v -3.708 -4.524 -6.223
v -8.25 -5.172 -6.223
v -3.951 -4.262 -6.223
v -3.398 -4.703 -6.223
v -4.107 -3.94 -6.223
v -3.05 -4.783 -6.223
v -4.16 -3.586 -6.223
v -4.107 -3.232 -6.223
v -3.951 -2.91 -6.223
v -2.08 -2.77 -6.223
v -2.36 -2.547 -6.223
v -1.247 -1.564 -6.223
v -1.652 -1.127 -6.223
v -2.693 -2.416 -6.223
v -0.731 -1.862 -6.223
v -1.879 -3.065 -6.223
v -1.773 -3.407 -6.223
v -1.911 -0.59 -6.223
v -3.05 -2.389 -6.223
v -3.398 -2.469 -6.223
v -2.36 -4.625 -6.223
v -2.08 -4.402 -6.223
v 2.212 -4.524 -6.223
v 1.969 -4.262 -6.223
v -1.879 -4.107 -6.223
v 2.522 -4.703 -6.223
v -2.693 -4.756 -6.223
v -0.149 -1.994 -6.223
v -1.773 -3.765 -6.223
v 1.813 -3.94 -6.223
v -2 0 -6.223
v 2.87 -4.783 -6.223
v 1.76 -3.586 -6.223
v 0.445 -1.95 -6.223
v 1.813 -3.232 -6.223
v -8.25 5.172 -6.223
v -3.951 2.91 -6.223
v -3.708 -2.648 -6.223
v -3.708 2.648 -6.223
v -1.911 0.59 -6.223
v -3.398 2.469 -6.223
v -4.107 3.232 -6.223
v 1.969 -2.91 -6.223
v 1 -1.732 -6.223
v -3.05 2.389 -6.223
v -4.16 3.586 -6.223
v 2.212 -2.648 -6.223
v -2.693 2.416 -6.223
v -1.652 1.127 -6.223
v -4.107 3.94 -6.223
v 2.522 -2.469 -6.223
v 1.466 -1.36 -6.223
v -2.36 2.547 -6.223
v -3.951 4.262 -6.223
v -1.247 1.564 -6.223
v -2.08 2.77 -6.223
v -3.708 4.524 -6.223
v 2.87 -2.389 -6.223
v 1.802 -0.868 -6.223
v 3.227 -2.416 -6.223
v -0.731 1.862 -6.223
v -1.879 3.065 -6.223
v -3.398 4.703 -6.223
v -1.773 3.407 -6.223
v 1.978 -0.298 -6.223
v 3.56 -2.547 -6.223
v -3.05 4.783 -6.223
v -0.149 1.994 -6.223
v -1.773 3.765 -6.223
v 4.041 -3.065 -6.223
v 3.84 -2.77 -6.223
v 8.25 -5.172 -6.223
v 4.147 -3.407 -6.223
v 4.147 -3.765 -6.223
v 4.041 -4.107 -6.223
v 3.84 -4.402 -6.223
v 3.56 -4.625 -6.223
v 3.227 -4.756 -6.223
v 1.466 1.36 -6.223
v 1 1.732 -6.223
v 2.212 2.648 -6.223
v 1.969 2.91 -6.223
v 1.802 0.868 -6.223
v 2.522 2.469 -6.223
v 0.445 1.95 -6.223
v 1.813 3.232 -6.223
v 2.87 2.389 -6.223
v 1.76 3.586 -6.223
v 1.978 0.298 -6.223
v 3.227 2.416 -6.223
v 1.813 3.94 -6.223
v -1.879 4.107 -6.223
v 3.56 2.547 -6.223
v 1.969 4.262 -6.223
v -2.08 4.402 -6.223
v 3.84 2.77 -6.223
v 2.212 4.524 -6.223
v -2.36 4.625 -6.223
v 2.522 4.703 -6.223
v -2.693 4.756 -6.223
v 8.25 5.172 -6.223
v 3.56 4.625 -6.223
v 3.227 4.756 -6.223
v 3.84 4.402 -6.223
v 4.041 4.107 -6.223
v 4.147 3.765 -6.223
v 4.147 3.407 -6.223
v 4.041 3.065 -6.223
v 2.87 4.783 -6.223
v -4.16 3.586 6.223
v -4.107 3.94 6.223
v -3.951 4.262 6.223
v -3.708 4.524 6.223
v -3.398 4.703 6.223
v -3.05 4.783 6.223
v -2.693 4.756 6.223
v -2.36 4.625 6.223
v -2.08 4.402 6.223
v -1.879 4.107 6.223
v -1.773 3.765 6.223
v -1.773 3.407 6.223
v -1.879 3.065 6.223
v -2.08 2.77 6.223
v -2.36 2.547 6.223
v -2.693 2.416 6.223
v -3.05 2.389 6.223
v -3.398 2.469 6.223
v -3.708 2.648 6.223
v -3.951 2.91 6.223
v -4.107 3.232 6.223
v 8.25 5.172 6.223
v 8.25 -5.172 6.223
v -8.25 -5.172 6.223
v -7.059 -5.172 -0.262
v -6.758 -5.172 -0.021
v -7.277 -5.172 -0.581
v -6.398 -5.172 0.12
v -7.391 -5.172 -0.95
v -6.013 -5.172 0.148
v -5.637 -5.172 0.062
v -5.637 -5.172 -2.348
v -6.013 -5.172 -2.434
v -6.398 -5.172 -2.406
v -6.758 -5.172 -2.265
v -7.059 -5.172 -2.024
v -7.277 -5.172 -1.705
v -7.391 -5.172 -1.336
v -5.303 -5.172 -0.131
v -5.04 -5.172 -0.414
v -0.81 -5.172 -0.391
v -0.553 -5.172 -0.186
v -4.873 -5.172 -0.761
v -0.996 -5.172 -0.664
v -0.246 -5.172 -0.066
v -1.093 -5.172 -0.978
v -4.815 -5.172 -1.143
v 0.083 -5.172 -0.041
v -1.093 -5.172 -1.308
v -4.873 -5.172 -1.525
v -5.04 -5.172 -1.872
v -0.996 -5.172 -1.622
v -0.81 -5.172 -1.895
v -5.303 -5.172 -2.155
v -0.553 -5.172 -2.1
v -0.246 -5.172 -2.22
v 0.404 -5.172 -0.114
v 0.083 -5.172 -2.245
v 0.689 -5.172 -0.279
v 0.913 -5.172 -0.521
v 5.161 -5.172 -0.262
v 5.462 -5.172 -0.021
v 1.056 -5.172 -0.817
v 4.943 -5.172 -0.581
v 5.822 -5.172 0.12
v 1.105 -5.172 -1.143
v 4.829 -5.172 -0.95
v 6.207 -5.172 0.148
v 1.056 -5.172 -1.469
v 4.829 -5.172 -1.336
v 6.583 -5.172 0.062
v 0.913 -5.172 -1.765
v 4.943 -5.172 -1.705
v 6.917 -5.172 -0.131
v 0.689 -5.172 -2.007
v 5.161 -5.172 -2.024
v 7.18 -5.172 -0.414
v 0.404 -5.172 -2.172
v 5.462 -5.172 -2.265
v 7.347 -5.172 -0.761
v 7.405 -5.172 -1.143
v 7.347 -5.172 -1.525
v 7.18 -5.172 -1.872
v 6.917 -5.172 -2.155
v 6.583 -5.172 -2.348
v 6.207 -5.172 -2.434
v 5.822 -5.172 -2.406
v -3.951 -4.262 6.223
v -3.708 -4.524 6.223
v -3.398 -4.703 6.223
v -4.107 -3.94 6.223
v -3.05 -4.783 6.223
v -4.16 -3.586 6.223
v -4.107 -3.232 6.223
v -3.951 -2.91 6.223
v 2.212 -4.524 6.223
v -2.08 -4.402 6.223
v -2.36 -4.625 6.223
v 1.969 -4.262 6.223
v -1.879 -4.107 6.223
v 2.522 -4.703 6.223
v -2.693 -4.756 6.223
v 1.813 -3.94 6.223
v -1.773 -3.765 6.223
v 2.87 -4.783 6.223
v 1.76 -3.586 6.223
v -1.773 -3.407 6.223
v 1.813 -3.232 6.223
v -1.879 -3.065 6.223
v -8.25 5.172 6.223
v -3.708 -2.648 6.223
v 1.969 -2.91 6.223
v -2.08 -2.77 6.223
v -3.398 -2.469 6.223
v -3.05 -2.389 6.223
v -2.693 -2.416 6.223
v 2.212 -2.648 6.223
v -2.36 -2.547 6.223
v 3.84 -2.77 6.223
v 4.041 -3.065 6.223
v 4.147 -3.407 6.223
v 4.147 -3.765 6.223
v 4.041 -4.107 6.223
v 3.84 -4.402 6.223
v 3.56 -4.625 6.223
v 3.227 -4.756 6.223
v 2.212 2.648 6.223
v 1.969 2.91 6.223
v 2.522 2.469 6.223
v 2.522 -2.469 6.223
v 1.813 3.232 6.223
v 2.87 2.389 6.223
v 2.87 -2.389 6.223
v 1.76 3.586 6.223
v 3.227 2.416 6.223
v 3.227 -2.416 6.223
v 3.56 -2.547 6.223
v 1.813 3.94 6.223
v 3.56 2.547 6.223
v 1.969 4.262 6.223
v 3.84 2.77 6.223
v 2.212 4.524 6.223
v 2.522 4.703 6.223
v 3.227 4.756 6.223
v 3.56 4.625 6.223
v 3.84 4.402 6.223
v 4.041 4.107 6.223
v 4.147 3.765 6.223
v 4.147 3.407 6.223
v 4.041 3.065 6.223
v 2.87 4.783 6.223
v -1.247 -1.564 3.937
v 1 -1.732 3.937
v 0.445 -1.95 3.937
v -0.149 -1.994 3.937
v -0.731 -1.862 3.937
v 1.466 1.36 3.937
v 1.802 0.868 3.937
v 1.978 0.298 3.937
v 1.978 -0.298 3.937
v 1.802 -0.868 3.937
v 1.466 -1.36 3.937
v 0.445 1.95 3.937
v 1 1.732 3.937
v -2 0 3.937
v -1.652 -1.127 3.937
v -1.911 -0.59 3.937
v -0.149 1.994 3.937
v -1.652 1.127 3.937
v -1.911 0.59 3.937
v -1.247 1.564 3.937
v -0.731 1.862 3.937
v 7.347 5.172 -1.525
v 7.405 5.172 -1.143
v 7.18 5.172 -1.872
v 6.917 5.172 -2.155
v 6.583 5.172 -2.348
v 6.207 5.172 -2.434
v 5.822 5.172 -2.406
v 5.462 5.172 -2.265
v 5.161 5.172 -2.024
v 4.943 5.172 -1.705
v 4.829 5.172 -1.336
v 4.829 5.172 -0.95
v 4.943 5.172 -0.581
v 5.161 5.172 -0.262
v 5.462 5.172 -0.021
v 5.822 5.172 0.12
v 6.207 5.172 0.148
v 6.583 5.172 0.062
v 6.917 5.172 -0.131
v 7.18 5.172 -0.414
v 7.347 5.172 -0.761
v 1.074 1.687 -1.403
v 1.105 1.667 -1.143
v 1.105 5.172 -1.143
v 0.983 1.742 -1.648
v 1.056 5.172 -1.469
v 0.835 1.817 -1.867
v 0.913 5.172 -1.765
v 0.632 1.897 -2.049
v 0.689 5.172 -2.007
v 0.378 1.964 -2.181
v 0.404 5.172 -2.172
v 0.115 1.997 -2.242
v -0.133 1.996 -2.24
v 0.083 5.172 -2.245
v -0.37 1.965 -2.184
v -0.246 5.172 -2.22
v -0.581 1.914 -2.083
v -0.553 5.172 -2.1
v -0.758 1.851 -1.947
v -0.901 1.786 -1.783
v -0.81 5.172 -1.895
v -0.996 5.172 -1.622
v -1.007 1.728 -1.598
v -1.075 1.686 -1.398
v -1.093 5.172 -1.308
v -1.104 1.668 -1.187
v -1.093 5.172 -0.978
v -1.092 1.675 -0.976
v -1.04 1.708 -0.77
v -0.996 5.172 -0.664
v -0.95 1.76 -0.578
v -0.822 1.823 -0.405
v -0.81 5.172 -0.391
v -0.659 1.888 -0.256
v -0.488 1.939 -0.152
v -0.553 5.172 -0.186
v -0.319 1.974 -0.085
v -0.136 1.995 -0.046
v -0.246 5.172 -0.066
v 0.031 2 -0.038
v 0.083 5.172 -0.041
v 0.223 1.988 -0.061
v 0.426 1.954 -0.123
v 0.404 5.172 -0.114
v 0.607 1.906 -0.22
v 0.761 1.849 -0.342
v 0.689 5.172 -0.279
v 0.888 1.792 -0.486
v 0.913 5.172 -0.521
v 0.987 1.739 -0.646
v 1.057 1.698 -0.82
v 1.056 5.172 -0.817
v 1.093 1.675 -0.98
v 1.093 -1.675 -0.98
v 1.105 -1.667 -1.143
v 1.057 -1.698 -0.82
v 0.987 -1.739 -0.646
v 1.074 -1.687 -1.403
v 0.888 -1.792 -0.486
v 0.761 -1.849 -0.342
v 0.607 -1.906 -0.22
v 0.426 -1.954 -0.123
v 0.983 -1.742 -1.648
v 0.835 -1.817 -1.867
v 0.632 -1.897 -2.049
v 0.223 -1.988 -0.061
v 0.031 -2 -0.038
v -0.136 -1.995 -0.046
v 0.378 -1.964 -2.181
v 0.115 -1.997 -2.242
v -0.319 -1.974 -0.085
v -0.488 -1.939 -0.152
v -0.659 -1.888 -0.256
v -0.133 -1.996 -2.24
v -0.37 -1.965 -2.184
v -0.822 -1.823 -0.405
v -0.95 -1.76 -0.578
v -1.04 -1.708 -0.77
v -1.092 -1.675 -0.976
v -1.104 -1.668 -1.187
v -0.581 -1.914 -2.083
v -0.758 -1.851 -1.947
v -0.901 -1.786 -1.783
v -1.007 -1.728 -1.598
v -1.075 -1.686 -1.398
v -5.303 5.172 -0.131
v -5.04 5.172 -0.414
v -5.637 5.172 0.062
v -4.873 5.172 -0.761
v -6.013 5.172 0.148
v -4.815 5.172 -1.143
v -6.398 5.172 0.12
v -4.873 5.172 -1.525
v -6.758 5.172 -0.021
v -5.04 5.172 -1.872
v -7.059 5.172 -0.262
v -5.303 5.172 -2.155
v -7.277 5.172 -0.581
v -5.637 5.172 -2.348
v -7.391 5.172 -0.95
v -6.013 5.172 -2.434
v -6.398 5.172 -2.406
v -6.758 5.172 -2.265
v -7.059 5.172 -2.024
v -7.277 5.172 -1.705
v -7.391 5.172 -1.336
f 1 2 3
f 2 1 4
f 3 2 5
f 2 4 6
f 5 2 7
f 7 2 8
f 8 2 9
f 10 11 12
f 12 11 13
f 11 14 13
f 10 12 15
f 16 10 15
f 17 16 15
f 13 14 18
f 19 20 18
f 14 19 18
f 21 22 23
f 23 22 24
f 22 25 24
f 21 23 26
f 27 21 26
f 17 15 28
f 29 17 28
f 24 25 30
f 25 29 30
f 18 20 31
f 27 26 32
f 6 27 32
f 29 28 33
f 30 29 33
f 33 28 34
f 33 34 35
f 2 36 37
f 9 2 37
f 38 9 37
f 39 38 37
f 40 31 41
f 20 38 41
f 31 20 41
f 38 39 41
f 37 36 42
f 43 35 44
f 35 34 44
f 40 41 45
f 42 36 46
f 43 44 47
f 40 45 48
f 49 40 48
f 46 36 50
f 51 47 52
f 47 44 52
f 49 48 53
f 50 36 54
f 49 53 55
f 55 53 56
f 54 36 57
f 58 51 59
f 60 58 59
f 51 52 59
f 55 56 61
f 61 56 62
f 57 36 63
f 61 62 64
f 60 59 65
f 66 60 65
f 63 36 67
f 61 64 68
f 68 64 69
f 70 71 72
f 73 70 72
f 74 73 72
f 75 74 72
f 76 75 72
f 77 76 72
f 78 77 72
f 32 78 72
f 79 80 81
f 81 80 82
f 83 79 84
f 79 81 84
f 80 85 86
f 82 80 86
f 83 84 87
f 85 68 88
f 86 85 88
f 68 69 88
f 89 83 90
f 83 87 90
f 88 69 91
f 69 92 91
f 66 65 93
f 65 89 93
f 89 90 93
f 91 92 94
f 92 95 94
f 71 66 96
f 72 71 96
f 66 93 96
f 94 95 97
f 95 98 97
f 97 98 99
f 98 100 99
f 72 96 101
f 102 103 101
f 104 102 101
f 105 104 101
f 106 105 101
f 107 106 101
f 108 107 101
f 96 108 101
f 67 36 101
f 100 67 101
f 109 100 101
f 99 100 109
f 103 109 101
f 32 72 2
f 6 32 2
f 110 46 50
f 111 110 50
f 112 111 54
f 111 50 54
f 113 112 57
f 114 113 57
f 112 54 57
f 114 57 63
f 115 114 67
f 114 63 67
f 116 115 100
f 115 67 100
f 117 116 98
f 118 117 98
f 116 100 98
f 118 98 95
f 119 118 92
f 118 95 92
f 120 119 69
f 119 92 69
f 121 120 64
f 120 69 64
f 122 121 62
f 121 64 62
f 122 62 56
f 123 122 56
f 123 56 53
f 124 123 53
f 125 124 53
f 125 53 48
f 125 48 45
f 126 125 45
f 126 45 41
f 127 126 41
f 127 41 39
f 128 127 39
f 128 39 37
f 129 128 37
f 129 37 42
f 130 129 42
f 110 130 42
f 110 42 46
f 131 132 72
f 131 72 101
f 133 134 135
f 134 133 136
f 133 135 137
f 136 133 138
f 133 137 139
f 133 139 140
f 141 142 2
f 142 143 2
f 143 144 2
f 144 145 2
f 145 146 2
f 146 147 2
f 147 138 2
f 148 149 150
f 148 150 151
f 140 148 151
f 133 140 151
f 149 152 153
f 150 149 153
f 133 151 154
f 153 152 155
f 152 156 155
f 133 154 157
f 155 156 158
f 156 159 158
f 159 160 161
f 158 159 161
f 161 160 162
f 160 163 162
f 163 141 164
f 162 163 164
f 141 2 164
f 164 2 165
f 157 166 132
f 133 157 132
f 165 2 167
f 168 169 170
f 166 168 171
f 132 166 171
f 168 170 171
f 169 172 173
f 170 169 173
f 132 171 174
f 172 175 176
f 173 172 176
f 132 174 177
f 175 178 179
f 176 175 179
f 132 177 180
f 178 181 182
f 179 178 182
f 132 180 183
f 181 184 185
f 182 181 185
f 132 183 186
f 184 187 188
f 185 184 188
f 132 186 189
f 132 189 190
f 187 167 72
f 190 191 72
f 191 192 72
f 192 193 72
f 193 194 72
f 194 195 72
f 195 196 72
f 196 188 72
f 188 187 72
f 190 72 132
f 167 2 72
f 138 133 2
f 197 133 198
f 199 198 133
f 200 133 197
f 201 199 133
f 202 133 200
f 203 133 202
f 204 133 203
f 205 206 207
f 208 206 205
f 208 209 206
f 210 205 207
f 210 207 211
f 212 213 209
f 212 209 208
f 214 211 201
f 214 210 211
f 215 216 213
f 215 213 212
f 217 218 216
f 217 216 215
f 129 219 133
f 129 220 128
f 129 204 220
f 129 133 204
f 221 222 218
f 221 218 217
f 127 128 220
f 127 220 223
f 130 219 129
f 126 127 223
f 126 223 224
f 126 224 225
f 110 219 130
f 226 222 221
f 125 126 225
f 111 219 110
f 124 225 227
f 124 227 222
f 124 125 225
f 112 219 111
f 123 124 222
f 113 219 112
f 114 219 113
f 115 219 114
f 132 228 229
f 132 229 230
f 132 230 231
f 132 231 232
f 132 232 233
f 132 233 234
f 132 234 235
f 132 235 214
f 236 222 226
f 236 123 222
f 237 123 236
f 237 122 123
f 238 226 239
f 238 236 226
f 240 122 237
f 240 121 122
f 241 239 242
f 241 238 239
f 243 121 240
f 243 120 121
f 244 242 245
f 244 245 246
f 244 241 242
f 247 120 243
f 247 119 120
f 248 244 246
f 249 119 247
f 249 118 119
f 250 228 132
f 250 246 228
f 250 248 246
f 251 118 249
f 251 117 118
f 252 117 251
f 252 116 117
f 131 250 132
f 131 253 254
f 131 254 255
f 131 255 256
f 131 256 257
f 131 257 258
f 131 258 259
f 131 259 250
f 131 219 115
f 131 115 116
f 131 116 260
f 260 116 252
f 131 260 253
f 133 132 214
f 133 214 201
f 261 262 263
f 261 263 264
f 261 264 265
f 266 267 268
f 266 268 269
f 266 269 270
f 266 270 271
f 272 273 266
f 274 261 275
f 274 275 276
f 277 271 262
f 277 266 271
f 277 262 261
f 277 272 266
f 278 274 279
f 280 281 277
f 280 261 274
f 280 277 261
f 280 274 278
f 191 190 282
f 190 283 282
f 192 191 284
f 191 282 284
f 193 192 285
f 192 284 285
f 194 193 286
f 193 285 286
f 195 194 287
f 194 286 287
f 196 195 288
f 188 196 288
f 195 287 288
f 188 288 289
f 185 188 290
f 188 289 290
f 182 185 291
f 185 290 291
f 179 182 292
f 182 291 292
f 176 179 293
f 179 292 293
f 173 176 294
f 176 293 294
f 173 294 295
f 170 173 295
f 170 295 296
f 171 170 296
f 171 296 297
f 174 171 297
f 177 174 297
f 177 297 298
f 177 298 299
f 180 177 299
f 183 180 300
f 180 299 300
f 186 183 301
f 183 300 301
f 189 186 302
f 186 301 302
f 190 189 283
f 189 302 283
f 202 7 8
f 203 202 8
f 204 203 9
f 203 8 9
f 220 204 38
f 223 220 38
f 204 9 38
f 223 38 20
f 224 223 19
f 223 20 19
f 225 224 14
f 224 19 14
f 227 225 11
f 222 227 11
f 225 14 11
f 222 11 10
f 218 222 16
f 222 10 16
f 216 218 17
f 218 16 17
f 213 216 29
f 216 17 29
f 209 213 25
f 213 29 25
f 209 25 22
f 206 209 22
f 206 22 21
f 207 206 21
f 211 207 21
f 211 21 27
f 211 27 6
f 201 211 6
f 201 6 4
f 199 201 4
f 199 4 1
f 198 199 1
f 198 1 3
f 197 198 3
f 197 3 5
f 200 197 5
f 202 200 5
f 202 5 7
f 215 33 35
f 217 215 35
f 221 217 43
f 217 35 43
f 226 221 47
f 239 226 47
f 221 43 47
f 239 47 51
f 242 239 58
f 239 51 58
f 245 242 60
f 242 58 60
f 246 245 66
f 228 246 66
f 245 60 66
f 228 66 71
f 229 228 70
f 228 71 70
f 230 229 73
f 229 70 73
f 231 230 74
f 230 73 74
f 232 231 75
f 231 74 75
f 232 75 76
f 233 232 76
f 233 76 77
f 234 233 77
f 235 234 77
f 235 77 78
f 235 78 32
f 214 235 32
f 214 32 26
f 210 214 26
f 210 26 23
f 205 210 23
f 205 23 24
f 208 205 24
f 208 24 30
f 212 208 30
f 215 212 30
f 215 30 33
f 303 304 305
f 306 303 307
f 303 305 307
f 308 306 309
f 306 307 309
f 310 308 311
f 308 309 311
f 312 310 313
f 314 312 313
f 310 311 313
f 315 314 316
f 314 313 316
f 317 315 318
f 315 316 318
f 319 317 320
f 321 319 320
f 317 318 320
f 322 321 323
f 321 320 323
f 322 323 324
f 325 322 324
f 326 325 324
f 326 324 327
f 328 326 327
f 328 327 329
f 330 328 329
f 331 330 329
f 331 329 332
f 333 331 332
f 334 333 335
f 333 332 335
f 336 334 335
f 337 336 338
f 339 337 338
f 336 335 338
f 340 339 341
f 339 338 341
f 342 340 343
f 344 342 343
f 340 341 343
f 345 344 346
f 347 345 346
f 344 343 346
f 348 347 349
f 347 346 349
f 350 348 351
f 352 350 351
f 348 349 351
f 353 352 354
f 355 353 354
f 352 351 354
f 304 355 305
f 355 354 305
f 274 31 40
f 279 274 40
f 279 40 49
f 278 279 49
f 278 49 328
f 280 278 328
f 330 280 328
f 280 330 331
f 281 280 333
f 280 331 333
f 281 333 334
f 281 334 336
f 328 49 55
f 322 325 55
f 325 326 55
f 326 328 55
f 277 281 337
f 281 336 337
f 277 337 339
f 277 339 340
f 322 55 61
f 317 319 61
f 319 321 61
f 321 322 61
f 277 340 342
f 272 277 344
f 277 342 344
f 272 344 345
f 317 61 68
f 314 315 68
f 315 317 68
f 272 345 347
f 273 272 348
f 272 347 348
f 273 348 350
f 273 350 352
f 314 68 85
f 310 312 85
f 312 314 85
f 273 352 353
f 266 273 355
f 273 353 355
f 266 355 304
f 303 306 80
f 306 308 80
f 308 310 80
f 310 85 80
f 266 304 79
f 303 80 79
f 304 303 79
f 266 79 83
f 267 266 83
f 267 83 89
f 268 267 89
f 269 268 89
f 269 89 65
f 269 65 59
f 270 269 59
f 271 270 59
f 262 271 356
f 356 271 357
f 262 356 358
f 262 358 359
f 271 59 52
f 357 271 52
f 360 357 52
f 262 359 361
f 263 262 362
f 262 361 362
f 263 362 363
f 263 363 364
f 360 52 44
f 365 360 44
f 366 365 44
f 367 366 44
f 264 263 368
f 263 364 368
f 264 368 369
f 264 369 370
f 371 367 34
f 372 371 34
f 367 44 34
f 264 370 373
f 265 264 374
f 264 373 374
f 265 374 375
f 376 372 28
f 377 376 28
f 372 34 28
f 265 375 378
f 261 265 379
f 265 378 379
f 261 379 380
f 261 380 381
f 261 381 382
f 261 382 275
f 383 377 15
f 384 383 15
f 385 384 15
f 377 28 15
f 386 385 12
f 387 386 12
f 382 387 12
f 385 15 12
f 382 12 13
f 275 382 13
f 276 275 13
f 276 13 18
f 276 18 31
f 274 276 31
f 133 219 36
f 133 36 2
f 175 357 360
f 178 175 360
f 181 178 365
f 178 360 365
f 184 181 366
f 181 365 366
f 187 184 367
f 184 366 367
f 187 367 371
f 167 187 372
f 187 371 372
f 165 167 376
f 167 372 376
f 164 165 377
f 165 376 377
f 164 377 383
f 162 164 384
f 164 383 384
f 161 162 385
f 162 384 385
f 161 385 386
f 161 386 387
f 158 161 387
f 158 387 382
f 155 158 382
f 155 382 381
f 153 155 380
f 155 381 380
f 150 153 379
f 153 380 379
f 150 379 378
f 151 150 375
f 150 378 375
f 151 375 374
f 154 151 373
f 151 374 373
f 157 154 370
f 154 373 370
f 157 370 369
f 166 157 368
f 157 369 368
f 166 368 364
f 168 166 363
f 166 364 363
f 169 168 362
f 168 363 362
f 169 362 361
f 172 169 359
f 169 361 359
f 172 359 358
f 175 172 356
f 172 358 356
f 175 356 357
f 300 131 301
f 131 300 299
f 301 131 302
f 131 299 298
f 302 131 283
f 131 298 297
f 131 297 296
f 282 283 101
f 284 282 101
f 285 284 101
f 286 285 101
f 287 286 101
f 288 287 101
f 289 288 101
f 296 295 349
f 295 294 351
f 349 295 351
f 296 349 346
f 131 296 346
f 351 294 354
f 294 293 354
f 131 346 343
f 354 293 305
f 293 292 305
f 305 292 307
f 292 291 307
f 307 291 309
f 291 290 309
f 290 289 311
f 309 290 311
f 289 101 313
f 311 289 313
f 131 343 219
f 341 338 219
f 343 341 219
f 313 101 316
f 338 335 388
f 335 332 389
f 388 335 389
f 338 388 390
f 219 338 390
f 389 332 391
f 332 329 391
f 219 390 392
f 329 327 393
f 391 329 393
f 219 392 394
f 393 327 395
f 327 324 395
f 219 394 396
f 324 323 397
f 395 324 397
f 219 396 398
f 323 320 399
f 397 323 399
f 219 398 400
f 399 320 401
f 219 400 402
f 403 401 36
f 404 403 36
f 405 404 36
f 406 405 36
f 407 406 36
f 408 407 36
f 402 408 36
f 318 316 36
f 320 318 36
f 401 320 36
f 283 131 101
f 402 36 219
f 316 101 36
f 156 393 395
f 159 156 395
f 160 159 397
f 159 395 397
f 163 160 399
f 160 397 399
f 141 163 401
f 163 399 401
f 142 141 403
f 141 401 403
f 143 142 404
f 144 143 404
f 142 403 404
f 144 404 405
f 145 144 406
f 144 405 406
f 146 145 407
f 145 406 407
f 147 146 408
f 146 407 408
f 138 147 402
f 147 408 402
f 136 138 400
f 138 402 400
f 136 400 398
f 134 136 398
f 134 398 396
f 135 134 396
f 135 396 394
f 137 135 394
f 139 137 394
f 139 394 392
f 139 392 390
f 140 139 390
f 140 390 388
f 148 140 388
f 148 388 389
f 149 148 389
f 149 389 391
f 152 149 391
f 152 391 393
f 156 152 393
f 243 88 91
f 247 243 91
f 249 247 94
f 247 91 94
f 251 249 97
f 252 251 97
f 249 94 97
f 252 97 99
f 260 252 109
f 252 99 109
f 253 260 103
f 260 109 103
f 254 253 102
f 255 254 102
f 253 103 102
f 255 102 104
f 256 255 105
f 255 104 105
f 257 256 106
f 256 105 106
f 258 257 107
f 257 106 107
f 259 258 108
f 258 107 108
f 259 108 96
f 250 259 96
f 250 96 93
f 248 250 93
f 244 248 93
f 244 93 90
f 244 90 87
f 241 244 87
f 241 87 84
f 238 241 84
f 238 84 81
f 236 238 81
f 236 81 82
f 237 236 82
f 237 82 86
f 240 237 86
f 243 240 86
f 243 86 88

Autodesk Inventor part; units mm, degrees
ref_plane "YZ Plane" through (0, 0, 0) normal (1, 0, 0) x (0, 1, 0)
ref_plane "XZ Plane" through (0, 0, 0) normal (0, 1, 0) x (-1, 0, 0)
ref_plane "XY Plane" through (0, 0, 0) normal (0, 0, 1) x (1, 0, 0)
sketch "Sketch1" plane through (0, 0, 0) normal (0, 0, 1) x (1, 0, 0)
  line L0 (8.25, 5.172) -> (-8.25, 5.172)
  line L1 (-8.25, 5.172) -> (-8.25, -5.172)
  line L2 (-8.25, -5.172) -> (8.25, -5.172)
  line L3 (8.25, -5.172) -> (8.25, 5.172)
  point P0 (0, 0)
  dimension "d19" = 10.344
  dimension "d36" = 16.5
  dimension "d37" = 5.172
extrude "Box" add sketch "Sketch1" along normal mid plane 12.446
sketch "Sketch3" plane through (0, 0, -6.223) normal (0, 0, -1) x (-1, 0, 0)
  line L0 (-5.08, 0) -> (5.08, 0) construction
  line L1 (-4.75, 0) -> (4.75, 0) construction
  circle A0 centre (0, 0) radius 2
  dimension "d35" = 4
extrude "Slot" cut sketch "Sketch3" against normal blind 10.16
sketch "Sketch4" plane through (0, 0, -6.223) normal (0, 0, -1) x (-1, 0, 0)
  circle A0 centre (-2.96, 3.586) radius 1.2
  line L0 (8.25, 5.172) -> (-8.25, 5.172) projected
  circle A1 centre (0, 0) radius 2 projected
  line L1 (-8.25, 5.172) -> (-8.25, -5.172) projected
  dimension "d32" = 2.4
  dimension "d34" = 1.586
  dimension "d38" = 3.172
  dimension "d39" = 5.29
extrude "MountingHole" cut sketch "Sketch4" against normal blind 12.5 contours A0
pattern_linear "Mounting Holes" count 2 spacing 5.92 along (-1, 0, 0) count 2 spacing 7.172 along (0, -1, 0) of "MountingHole"
sketch "Sketch6" plane through (-8.25, 5.172, 6.223) normal (0, 1, 0) x (1, 0, 0)
  circle A0 centre (8.25, 7.366) radius 1.105
  point P0 (8.25, 6.223)
  dimension "d20" = 2.21
extrude "CentralSMAHole" cut sketch "Sketch6" against normal blind 12
sketch "Sketch8" plane through (-8.25, 5.172, 6.223) normal (0, 1, 0) x (1, 0, 0)
  circle A0 centre (14.36, 7.366) radius 1.295
  dimension "d23" = 2.59
extrude "SMAMounting" cut sketch "Sketch8" against normal blind 12
pattern_linear "SMAMountingHoles" count 2 spacing 12.22 along (-1, 0, 0) of "SMAMounting"
equation "\"d37\" = 0.5 * d19"
equation "\"d34\" = 0.5 * d38"
properties part number "NewSinkV2"
